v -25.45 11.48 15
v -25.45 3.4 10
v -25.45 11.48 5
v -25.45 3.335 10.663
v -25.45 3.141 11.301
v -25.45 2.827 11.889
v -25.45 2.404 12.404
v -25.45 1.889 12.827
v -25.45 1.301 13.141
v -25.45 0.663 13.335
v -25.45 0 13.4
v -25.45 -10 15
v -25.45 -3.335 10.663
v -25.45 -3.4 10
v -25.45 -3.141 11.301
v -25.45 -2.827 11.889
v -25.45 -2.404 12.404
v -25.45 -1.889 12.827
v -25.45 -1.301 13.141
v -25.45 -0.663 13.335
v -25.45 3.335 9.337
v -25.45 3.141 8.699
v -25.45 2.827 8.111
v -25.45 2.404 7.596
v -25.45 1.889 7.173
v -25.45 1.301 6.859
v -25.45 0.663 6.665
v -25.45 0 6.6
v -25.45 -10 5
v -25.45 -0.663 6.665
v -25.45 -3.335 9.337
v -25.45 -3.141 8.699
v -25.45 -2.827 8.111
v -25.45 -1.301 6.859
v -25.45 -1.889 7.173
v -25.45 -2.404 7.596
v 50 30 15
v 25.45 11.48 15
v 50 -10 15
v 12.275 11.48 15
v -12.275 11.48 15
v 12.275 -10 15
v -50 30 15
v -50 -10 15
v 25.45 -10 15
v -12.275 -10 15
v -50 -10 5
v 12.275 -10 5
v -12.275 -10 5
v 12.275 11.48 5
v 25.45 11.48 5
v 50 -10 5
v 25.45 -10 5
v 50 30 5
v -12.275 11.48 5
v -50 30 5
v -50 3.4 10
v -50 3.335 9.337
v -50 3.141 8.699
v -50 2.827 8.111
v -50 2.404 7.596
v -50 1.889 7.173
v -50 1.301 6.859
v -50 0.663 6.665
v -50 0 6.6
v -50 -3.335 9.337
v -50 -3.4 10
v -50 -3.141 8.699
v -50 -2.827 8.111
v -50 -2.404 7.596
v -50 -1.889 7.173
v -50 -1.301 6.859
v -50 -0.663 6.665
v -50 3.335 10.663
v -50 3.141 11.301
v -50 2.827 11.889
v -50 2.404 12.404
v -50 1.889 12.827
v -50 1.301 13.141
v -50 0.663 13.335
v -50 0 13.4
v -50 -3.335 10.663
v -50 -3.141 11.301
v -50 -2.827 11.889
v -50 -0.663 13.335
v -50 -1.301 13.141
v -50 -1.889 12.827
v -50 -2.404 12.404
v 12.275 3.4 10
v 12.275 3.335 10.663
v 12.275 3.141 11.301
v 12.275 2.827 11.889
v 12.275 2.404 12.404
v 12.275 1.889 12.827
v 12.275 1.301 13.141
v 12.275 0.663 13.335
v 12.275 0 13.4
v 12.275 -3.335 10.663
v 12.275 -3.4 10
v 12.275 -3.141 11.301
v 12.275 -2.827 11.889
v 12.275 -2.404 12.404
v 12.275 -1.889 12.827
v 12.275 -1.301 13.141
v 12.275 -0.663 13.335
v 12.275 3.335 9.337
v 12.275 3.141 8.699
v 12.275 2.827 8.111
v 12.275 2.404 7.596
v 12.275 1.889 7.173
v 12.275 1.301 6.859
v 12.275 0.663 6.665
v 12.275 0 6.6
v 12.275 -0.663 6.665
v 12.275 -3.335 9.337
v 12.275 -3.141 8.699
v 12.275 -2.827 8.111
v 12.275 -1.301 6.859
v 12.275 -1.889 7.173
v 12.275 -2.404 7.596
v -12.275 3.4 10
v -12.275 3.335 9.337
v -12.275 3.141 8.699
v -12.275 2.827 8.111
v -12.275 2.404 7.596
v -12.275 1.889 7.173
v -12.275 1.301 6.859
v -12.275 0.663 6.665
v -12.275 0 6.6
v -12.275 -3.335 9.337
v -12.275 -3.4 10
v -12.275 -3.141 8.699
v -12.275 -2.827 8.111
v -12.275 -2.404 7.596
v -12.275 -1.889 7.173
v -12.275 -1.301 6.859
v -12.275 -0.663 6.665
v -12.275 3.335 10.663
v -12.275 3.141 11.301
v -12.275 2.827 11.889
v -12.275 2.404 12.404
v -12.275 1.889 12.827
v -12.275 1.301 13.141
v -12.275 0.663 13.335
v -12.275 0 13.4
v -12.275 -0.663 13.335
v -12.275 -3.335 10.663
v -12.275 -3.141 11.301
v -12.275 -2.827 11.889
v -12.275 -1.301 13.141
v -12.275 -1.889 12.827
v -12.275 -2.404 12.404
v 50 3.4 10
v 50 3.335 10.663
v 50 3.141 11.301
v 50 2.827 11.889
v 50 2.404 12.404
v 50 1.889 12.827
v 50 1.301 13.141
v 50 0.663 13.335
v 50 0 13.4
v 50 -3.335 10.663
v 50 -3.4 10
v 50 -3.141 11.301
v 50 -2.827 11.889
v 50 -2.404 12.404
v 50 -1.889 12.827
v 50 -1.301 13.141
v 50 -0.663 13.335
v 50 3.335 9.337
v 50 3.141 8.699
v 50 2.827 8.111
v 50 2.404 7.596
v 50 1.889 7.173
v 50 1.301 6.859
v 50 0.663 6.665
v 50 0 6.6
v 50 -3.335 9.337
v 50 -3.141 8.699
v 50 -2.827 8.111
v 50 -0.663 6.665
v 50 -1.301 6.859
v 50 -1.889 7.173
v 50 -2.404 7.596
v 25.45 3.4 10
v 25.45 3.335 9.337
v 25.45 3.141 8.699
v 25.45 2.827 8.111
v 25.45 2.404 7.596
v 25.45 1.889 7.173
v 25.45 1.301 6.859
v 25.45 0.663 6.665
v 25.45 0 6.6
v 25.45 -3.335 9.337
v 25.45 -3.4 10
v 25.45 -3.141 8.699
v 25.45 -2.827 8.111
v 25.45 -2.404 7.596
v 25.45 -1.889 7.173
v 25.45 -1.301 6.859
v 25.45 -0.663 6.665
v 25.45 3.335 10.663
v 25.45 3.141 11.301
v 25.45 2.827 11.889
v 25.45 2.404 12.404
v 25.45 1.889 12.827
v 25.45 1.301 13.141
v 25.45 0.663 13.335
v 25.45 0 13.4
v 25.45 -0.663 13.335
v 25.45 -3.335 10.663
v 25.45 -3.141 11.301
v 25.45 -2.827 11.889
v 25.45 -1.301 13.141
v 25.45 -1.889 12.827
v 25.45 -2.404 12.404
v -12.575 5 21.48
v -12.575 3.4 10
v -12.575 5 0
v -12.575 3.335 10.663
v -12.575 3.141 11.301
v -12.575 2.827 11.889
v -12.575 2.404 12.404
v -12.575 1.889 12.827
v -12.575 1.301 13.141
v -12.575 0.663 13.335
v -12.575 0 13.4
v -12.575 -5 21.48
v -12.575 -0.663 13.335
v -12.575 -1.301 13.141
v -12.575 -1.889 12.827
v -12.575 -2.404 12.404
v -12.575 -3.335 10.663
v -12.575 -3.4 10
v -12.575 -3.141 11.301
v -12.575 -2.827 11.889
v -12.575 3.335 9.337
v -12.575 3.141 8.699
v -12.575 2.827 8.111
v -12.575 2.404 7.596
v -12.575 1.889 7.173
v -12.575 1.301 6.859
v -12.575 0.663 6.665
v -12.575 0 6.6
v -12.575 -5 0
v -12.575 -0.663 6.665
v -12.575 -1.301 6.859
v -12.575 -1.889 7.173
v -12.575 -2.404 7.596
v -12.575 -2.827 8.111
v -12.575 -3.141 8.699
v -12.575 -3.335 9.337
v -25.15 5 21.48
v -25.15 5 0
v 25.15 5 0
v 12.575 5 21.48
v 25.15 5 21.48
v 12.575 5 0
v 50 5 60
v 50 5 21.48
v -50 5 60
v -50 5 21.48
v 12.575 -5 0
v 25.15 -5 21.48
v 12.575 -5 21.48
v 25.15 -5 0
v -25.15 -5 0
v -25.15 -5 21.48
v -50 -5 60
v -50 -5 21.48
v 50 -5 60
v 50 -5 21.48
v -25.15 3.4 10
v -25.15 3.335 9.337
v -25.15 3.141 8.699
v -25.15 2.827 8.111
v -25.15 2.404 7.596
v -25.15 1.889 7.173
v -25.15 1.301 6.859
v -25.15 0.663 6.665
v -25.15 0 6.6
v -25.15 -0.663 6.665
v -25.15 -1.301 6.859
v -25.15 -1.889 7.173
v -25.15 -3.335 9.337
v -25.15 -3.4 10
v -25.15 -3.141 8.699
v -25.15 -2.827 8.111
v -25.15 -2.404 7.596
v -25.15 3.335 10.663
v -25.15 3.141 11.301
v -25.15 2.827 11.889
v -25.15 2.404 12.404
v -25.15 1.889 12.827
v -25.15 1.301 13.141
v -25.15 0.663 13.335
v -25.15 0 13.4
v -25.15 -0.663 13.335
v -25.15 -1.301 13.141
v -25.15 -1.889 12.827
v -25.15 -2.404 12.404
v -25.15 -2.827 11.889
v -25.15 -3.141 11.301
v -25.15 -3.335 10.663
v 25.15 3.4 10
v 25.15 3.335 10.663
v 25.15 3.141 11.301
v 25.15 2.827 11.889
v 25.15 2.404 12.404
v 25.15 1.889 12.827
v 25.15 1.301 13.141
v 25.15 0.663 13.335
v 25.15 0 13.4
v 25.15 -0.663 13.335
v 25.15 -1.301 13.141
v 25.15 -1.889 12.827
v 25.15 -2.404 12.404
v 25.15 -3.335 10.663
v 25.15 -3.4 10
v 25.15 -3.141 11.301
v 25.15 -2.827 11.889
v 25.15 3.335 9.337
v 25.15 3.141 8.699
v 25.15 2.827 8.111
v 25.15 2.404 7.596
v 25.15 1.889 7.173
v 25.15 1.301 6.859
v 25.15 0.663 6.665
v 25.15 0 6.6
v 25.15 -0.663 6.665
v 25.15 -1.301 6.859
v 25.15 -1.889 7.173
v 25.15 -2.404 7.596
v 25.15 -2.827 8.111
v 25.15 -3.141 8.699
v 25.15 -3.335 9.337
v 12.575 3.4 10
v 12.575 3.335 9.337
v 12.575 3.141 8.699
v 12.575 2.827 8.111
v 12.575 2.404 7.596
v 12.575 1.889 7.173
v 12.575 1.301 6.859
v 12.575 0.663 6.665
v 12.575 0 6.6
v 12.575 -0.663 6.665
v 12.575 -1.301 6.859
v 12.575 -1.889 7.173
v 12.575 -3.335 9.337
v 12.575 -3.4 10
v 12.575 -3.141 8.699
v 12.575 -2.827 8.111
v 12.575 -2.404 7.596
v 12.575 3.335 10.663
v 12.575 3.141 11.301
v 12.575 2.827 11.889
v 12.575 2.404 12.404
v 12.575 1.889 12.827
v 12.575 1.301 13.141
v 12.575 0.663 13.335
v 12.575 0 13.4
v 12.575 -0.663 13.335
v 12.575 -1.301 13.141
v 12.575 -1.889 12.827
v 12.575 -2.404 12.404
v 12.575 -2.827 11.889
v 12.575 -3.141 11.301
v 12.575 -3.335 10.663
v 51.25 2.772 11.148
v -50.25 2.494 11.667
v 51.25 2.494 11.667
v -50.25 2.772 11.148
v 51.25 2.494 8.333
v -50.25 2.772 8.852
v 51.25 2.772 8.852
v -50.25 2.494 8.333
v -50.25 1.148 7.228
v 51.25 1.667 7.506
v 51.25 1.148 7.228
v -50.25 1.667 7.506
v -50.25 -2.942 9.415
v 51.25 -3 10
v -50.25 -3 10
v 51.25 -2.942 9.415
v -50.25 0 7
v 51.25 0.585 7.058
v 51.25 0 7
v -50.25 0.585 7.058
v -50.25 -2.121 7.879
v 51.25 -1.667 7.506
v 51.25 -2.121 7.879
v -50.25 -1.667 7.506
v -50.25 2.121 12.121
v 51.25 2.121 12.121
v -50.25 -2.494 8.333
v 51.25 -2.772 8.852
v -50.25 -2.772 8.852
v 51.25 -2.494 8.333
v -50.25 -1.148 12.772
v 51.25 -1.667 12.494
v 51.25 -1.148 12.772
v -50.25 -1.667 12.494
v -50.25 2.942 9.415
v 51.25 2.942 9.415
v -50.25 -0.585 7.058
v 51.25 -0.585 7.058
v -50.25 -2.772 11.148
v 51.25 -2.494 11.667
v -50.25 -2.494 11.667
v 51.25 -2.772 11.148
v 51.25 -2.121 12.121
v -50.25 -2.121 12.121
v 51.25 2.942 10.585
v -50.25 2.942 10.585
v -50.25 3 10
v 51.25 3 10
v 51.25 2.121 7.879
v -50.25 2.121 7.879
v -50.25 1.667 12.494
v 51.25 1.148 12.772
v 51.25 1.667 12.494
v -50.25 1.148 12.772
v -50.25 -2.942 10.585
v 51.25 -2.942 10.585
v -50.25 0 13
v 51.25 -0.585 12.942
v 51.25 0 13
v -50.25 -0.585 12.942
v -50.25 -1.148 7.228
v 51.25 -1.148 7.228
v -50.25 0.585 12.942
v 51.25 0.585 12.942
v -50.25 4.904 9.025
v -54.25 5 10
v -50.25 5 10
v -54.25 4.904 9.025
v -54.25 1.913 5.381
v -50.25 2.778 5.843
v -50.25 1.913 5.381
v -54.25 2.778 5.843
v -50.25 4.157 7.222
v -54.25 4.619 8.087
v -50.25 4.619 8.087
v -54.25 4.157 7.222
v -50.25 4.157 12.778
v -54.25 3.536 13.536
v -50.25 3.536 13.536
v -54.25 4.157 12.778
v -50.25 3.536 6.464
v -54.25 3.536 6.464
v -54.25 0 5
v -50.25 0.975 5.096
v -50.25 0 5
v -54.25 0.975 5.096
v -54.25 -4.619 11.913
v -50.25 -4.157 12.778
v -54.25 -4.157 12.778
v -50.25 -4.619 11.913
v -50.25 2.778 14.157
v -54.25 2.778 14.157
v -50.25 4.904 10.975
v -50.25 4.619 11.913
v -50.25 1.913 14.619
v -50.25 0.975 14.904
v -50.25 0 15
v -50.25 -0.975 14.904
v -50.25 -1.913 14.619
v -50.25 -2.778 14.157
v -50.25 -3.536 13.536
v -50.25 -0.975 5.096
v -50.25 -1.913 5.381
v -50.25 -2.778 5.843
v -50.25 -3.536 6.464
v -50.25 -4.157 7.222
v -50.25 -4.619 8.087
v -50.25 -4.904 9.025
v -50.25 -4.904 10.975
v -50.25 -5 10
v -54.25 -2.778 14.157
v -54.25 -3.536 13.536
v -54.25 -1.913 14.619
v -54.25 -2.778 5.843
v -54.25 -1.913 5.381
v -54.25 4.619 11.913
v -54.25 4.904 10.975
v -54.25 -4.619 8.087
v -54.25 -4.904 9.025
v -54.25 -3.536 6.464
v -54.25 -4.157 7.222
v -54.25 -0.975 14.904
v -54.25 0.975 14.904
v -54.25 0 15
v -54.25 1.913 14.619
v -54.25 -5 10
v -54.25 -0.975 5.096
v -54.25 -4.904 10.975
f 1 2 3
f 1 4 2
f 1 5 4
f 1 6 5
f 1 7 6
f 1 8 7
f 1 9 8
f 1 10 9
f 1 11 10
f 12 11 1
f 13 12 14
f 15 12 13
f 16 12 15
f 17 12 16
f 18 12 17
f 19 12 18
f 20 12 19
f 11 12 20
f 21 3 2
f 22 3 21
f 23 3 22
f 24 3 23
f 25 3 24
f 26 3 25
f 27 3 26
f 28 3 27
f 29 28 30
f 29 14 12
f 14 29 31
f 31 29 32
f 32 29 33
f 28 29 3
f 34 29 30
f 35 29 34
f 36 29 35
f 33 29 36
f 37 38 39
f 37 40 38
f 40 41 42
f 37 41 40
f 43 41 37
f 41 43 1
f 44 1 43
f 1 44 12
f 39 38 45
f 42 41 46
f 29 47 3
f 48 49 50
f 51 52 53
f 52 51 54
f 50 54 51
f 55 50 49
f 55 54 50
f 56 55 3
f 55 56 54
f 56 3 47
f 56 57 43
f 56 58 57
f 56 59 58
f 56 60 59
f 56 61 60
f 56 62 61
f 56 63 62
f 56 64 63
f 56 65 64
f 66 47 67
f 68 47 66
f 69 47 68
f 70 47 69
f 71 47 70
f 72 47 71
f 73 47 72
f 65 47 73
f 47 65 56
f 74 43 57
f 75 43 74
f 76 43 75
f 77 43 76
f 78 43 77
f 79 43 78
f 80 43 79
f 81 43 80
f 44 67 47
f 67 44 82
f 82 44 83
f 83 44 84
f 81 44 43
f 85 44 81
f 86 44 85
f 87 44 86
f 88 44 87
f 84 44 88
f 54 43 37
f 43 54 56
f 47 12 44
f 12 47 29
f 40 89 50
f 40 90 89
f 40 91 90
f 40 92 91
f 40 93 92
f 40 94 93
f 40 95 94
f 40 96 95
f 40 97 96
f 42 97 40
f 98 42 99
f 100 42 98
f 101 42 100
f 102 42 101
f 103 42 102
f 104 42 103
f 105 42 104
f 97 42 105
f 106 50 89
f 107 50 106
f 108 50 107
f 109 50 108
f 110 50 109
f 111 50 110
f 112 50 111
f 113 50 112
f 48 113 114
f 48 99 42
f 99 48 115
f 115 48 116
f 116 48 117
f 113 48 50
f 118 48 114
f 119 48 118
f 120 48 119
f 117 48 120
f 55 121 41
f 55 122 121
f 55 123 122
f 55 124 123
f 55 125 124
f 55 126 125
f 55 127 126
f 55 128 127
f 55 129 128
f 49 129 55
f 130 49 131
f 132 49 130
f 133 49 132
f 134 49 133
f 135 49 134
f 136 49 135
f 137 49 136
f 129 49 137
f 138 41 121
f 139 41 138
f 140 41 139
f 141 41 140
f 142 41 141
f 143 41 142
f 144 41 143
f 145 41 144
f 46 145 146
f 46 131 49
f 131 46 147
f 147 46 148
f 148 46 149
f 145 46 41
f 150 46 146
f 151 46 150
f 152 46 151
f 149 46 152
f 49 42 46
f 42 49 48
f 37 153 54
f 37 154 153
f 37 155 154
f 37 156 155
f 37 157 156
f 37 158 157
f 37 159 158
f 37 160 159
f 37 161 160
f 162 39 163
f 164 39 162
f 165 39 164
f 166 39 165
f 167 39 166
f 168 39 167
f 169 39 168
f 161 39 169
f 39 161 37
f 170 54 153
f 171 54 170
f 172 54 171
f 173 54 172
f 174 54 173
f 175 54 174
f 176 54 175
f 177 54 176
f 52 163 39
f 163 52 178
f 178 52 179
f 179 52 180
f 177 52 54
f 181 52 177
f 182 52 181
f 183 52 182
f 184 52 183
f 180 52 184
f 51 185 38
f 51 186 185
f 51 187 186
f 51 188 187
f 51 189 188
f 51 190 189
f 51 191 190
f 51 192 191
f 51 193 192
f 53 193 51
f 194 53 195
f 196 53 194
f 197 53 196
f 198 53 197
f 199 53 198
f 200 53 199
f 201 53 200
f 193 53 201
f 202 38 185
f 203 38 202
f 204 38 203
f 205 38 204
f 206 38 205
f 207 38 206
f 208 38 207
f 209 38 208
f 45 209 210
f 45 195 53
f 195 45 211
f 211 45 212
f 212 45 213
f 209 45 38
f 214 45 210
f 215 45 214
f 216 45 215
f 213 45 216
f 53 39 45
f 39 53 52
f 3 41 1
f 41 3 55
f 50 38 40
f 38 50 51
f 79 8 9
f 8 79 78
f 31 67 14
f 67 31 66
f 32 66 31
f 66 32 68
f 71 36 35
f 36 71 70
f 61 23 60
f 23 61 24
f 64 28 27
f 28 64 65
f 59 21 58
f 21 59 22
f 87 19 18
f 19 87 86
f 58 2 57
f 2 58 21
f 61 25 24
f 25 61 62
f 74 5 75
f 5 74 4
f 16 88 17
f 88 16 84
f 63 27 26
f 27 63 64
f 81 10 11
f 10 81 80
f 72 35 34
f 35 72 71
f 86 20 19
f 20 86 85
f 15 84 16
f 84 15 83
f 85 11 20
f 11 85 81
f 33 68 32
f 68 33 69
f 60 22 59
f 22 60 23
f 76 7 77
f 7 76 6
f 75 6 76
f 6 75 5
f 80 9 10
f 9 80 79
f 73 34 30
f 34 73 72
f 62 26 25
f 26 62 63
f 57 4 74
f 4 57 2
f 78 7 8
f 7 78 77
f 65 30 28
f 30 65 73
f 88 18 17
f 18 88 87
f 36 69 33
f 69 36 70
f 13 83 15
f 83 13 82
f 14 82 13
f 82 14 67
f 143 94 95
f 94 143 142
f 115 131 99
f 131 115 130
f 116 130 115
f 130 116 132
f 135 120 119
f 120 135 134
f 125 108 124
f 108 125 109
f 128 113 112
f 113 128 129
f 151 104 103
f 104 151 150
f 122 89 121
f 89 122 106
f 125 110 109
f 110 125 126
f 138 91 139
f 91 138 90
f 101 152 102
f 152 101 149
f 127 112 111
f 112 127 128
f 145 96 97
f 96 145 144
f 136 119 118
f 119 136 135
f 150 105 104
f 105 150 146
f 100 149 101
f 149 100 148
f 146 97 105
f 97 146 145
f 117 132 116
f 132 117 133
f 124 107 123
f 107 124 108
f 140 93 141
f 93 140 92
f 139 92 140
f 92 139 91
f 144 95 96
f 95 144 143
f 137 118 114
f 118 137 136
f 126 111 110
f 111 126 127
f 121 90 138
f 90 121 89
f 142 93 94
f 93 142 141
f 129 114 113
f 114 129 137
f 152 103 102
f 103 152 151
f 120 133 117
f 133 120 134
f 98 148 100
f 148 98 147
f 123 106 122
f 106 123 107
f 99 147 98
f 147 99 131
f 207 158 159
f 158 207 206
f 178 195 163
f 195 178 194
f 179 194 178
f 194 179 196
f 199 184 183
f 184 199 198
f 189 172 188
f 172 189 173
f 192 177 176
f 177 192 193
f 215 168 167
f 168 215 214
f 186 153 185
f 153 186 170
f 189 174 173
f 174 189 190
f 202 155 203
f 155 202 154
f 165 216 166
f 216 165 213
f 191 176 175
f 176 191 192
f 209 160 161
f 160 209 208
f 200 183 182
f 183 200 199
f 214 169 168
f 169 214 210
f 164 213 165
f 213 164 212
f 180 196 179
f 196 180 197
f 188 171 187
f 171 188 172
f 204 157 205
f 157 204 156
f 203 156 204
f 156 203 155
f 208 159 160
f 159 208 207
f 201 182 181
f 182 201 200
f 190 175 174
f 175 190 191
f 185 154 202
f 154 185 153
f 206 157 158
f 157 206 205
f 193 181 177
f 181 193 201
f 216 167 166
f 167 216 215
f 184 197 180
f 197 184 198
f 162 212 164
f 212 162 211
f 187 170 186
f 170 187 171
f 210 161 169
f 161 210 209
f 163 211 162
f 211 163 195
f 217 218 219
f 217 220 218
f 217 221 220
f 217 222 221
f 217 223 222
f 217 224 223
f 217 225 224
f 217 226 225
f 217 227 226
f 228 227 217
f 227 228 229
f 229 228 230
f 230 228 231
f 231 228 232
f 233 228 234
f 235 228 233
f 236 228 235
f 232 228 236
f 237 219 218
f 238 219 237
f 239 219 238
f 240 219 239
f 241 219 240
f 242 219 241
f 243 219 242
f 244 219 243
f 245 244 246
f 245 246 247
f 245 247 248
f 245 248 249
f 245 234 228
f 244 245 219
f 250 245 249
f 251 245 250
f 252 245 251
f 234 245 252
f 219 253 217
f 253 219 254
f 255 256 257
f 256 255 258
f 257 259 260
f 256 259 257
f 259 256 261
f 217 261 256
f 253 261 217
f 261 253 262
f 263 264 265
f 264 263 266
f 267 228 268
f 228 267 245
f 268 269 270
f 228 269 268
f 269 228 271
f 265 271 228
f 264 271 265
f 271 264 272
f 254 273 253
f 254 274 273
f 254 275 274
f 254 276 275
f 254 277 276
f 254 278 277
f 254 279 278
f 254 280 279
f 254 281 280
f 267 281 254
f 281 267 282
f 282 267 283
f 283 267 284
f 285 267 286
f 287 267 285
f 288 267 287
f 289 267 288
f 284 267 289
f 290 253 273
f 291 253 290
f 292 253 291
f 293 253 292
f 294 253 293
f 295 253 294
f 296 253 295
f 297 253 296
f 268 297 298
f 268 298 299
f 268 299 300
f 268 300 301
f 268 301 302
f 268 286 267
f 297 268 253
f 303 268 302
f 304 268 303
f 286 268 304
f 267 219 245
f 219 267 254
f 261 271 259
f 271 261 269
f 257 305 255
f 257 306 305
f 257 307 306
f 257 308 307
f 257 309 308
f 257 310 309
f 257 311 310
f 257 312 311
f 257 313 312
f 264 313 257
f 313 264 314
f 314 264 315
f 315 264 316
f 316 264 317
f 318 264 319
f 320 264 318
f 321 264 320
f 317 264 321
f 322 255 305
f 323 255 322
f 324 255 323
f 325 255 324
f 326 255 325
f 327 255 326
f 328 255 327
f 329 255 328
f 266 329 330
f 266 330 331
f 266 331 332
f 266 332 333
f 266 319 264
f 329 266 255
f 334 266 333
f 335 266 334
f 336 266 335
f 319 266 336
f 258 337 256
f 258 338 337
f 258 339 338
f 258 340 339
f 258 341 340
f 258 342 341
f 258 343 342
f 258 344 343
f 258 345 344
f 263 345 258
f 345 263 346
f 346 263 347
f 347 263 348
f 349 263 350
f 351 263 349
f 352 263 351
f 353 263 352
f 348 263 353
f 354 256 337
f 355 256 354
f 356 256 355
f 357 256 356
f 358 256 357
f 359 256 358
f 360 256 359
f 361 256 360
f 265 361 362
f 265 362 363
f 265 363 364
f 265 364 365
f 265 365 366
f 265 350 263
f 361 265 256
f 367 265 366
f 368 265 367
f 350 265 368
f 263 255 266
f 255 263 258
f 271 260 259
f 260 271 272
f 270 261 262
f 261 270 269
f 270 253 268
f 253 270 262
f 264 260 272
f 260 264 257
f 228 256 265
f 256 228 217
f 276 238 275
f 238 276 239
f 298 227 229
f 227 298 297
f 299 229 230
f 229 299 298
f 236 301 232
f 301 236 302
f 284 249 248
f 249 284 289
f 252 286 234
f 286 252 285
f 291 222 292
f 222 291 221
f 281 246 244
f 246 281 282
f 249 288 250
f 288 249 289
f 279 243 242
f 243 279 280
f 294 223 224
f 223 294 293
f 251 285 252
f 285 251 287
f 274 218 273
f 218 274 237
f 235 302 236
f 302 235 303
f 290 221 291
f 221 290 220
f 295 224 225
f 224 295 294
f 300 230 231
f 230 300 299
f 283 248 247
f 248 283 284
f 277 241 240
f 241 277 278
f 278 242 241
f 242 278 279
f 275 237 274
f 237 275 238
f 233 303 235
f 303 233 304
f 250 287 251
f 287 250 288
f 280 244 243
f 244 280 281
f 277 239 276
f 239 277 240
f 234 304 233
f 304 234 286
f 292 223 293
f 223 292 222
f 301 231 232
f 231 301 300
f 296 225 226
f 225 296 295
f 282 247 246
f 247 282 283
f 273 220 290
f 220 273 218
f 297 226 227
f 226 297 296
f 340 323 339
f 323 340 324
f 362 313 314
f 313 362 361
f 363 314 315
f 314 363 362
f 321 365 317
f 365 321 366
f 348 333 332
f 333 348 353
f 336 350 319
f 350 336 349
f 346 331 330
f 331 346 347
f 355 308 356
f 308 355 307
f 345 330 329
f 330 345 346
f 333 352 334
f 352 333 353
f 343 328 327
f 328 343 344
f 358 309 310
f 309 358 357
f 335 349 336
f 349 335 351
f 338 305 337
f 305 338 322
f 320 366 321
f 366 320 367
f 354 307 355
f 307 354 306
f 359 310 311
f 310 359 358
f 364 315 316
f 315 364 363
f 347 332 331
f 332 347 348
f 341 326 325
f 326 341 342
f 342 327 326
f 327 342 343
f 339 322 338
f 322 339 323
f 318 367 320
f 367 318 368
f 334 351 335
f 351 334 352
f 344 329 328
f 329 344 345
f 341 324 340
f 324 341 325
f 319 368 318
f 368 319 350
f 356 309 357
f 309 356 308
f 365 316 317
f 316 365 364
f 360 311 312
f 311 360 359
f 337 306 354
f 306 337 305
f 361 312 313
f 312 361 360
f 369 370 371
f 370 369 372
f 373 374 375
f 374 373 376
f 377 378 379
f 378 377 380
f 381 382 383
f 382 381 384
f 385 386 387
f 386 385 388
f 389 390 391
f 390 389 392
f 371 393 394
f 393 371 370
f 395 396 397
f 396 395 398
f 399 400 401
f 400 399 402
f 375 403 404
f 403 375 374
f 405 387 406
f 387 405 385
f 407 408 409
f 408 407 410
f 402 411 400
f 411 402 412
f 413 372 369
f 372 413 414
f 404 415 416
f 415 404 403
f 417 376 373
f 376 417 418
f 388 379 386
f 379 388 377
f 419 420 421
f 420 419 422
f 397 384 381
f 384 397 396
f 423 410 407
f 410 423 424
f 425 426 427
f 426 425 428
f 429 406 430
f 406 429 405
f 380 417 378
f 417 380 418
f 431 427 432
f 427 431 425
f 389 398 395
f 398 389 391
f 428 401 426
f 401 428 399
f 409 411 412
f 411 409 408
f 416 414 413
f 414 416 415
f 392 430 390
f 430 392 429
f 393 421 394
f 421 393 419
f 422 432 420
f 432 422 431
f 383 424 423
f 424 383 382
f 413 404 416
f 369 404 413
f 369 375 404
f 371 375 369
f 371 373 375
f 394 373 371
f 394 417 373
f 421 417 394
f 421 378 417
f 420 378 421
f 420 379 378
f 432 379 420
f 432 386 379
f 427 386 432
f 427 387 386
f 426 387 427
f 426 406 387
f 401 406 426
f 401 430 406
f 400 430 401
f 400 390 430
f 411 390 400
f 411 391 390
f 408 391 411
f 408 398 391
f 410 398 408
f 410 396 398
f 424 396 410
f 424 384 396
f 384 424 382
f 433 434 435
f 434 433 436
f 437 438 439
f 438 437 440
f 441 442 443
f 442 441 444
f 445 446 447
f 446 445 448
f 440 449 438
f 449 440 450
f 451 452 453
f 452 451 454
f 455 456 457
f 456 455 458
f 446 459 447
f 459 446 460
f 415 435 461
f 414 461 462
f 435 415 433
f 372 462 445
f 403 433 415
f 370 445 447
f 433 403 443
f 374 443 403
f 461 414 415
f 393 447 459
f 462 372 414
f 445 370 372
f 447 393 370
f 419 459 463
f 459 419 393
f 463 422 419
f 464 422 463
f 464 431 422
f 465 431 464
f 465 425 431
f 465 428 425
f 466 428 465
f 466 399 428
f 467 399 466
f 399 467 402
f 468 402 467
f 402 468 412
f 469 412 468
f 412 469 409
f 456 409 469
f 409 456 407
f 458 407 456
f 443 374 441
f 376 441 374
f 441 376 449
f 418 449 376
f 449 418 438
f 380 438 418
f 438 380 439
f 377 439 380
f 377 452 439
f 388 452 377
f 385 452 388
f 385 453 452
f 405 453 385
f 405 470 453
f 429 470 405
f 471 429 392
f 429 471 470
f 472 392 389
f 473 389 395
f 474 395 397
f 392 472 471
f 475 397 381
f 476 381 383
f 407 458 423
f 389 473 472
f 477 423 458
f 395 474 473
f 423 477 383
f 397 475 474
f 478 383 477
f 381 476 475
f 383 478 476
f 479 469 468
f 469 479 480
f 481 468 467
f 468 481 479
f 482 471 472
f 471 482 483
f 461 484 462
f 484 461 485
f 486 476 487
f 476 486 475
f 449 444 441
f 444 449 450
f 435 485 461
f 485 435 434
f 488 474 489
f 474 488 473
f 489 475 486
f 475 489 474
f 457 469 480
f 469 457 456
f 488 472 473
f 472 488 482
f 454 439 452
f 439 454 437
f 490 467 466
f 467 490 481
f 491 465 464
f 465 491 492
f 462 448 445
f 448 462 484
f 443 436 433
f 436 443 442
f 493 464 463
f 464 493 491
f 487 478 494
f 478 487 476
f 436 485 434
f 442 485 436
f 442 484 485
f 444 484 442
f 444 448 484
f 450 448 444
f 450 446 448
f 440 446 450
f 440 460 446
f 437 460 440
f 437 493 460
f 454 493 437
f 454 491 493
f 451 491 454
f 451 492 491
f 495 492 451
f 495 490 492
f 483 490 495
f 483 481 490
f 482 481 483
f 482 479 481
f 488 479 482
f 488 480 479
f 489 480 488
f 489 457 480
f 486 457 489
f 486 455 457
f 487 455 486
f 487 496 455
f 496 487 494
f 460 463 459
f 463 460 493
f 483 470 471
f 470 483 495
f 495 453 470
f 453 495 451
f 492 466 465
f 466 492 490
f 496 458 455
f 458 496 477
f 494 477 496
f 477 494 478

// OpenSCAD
$fn = 32;

// ------------------------------------------------------------------------
// Butt hinge: hinge 100 mm, leaf swung 270 deg
// Every part is its own module, assembly() places every instance.
// ------------------------------------------------------------------------

// --- part 1 ---
module hinge_base() {
  difference() {
    union() {
      translate([-50, -10, -5]) cube([24.55, 40, 10]);
      translate([-12.275, -10, -5]) cube([24.55, 40, 10]);
      translate([25.45, -10, -5]) cube([24.55, 40, 10]);
      translate([-50, 11.48, -5]) cube([100, 18.52, 10]);
    }
    translate([-37.725, 0, 0]) rotate([0, 90, 0]) cylinder(h = 26.55, d = 6.8, center = true);
    translate([0, 0, 0]) rotate([0, 90, 0]) cylinder(h = 26.55, d = 6.8, center = true);
    translate([37.725, 0, 0]) rotate([0, 90, 0]) cylinder(h = 26.55, d = 6.8, center = true);
  }
}

// --- part 2 ---
module hinge_mover() {
  difference() {
    union() {
      translate([-25.15, -50, -5]) cube([12.575, 60, 10]);
      translate([12.575, -50, -5]) cube([12.575, 60, 10]);
      translate([-50, -50, -5]) cube([100, 38.52, 10]);
    }
    translate([-18.863, 0, 0]) rotate([0, 90, 0]) cylinder(h = 14.575, d = 6.8, center = true);
    translate([18.863, 0, 0]) rotate([0, 90, 0]) cylinder(h = 14.575, d = 6.8, center = true);
  }
}

// --- part 3 ---
module hinge_pin() {
  rotate([0, 90, 0]) cylinder(h = 102.5, d = 6, center = true);
  translate([-54.25, 0, 0]) rotate([0, 90, 0]) cylinder(h = 4, d = 10);
}

// --- assembly ---
module assembly() {
  color([0.80, 0.24, 0.20]) translate([0, 0, 10]) rotate([0, 0, 0]) hinge_base();
  color([0.20, 0.45, 0.75]) translate([0, 0, 10]) rotate([270, 0, 0]) hinge_mover();
  color([0.25, 0.62, 0.32]) translate([0, 0, 10]) rotate([0, 0, 0]) hinge_pin();
}

assembly();
